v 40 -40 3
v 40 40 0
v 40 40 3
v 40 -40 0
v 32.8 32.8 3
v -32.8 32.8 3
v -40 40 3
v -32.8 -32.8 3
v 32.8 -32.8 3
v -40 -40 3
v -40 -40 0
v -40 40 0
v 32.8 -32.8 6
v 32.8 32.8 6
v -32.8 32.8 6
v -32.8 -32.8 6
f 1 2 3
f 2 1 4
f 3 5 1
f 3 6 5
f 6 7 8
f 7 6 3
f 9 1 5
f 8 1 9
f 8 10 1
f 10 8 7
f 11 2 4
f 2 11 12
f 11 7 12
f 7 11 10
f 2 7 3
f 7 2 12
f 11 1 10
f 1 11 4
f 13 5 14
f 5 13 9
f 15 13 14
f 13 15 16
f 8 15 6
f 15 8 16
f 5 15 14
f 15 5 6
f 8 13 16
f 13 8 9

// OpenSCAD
//////////VARIABLE DECLARATIONS//////////

//preview[view:north east, tilt: top diagonal]

//QR Code Data Display Method
add_sub = 2; //[1:Subtract QR Geometry,2:Add QR Geometry]

//QR Code Mirroring. No: QR code is scanable from top of object. Yes: QR code is scanable from bottom of object. NOTE: Code is already flipped for iPhone cases so it will be scanable from back of iPhone case.
code_flip = 0; //[0:No,1:Yes]

//Select Main Object
obj = 1; //[0:QR data only,1:Rectangle,2:iPhone 4,3:iPhone 5,4:Rectangle with hole]

//Thickness option for iPhone cases
case_thickness = 1.8; //[1.8:Slim,2.4:Sturdy]

//For rectangles only (will also round perimeters)
round_corner = 1; //[1:No,2:Yes]

//Two opposite corners or all four corners
corner_num = 0; //[0:Two,1:Four]

//For rectangles and perimeters only (will also round perimeters) (mm)
corner_radius = 10; 

//Width of object (mm)
tag_width = 80;

//Height of object (mm)
tag_height = 80;

//Thickness of object (mm)
tag_thickness = 3;

//X Location of hole center (for rectangle with hole) (mm)
hole_x = 30;

//Y Location of hole center (for rectanlge with hole) (mm)
hole_y = 0;

//Radius of hole (for rectanlge with hole) (mm)
hole_r = 10;

//Distance from tag edge. "-1000" for none. (works with all models, but uses tag_width, tag_height plus perimeter dimensions for size) (mm)
perimeter = -1000;

//Wall thickness of perimeter (mm)
per_w = 3;

//Wall height of perimeter (mm)
per_h = 10;

//Scale multiplier for code (base size: 1mm cubes make each code block) (multiplier)
qr_scale = 1.6;

//(DO NOT PUT IN 0 customizer won't generate stl, instead put in a very small value like 0.001 for no tolerance) Use for making a positive and negative assembly (+val makes code blocks bigger) (mm)
qr_tolerance = 0.001;

//X location of QR code center (mm)
qr_x = 0;

//Y location of QR code center (mm)
qr_y = 0;

//Z location of bottom of QR code gemometry (mm)
qr_bottom = 1;

//Thickness of QR code (mm)
qr_thickness = 5;

//Rotate QR code around z-axis (deg)
qr_rotate = 0;

//Input from data generator for dimention of QR code (copy and paste from QR SIZE.txt)
qr_size = 41;

//Input raw QR data matrix here (copy and paste from QR DATA.txt) ("5" will make a rectangle the size of the QR code bounding box driven by qr_size value entered above. NOTE: rectangle will be slightly larger than actual code data due to "white" pixels around QR code in image)
qr_data = 5;

qr_num = qr_size*qr_size;


//////////GEOMETRY MANIPULATION//////////

//Just qr data
if (obj == 0)
{
	qr_mover(qr_x, qr_y, qr_bottom, qr_rotate, qr_scale);
	if (perimeter != -1000)
	{
		perimeter();
	}
}

//Basic rectangle tag
if (obj == 1)
{
	if (add_sub == 1)
	{
		difference()
		{
			rec_tag(tag_width, tag_height, tag_thickness);
			qr_mover(qr_x, qr_y, qr_bottom, qr_rotate, qr_scale);
		}
	}
	if (add_sub == 2)
	{
		union()
		{
			rec_tag(tag_width, tag_height, tag_thickness);
			qr_mover(qr_x, qr_y, qr_bottom, qr_rotate, qr_scale);
		}
	}
	if (perimeter != -1000)
	{
		perimeter();
	}
}

//iPhone 4
if(obj == 2)
{
	if (add_sub == 1)
	{
		difference()
		{
			iPhone4Case();
			translate([0,0,qr_thickness-.1])
			rotate([180,0,0])
			qr_mover(qr_x, qr_y, qr_bottom, qr_rotate, qr_scale);
		}
	}
	if (add_sub == 2)
	{
		union()
		{
			iPhone4Case();
			translate([0,0,qr_thickness-.1])
			rotate([180,0,0])
			qr_mover(qr_x, qr_y, qr_bottom, qr_rotate, qr_scale);
		}
	}
}


//iPhone 5
if(obj == 3)
{
	if (add_sub == 1)
	{
		difference()
		{
			iPhone5Case();
			translate([0,0,qr_thickness-.1])
			rotate([180,0,0])
			qr_mover(qr_x, qr_y, qr_bottom, qr_rotate, qr_scale);
		}
	}
	if (add_sub == 2)
	{
		union()
		{
			iPhone5Case();
			translate([0,0,qr_thickness-.1])
			rotate([180,0,0])
			qr_mover(qr_x, qr_y, qr_bottom, qr_rotate, qr_scale);
		}
	}
}


//Rectangle with hole
if (obj == 4)
{
	if (add_sub == 1)
	{
		difference()
		{
			rec_tag(tag_width, tag_height, tag_thickness);
			qr_mover(qr_x, qr_y, qr_bottom, qr_rotate, qr_scale);
			translate([hole_x, hole_y, 1])
			cylinder(h=(2*tag_thickness), r=hole_r, center=true);
		}
	}
	if (add_sub == 2)
	{
		difference()
		{
			union()
			{
				rec_tag(tag_width, tag_height, tag_thickness);
				qr_mover(qr_x, qr_y, qr_bottom, qr_rotate, qr_scale);
			}
			translate([hole_x, hole_y, 1])
			cylinder(h=(2*tag_thickness), r=hole_r, center=true);
		}
	}
	if (perimeter != -1000)
	{
		perimeter();
	}
}


//////////MODULE DEFINITIONS//////////

module qr_volume(size, num, data, thickness, tol)
{
	if (qr_data == 5)
	{
		color("Snow")
		translate([0, 0, thickness/2])
		cube([size, size, thickness], center=true);
	}
	else
	{
		color("DarkGrey")
		union()
		{
			for(i = [1:1:num])
			{
				if(data[i-1] == 1)
				{
					translate([(floor(i/size)-(qr_size/2)),(i-(size*floor(i/size))-1-(qr_size/2)), 0])
					cube([1+tol, 1+tol, thickness],center=[.5,.5,0]);
				}
			}
		}
	}
}

module qr_mover(x, y, z, rotate, scale)
{
	translate([x,y,z])
	rotate([0, 0, rotate])
	scale([scale, scale, 1])
	mirror([0, code_flip, 0])
	qr_volume(qr_size, qr_num, qr_data, qr_thickness, qr_tolerance);
}

module corner_rounder(w, h, t)
{
	for (c = [0:1:corner_num])
	{
		union()
		{
			mirror([0, c, 0])
			difference()
			{
				translate([w/2, h/2, t/2])
				cylinder(h=t*2, r=corner_radius, center=true);
				translate([(w/2)-corner_radius, (h/2)-corner_radius, t/2])
				cylinder(h=t*3, r=corner_radius, center=true);
			}
			mirror([0, c, 0])
			difference()
			{
				translate([-w/2, -h/2, t/2])
				cylinder(h=t*2, r=corner_radius, center=true);
				translate([-(w/2)+corner_radius, -(h/2)+corner_radius, t/2])
				cylinder(h=t*3, r=corner_radius, center=true);
			}
		}
	}
}

module rec_tag(t_w, t_h, t_t)
{
	difference()
	{
		translate([0, 0, (t_t/2)])
		cube([t_w, t_h, t_t], center=true);
		if (round_corner == 2)
		{
			corner_rounder(t_w, t_h, t_t);
		}
	}
}

module perimeter()
{
	difference()
	{
		rec_tag(tag_width+perimeter+per_w, tag_height+perimeter+per_w, per_h);
		translate([0, 0, -1])
		rec_tag(tag_width+perimeter, tag_height+perimeter, per_h+2);
	}
}




//////////MAKERBOT IPHONE CASE//////////


/*Non customizer variables*/
caseThickness = case_thickness;
caseTolerance = .2/1;

4width=58.55/1;	
4length=115.15/1;
4height=9.34/1;
4cornerR = 8.77/1;
4swidth=6.17/1;
4sthick=.6/1;

5width = 57.57/1;
5length = 122.83/1;
5height = 7.6/1;
5cornerR = 9.28/1;
5sthick = 1.44/1;
5swidth = 5height - 5sthick*1.5;

heightvar=.24/1;

homebuttonR = 5.6/1;
homebuttonD = homebuttonR*2;

top_bottom_opening_width = 50/1;
leftholelength = 25.43/1;
leftholeR = 2.4/1;
topholelength = 38.57/1;
topholeR = 2.5/1;
bottomholelength1 = 43.97/1;
bottomholelength2 = 26.05/1;
bottombigR = 1.53/1;
bottomsmallR = 1.15/1;

corner_resolution = 6/1;
circle_resolution = corner_resolution*4;

fudge = .05/1;


//MODULES

module iPhoneGlass(w, l, h, r)
{
	union(){
		cube([w,l-r*2,h],center = true);
		cube([w-r*2,l,h],center = true);
		//top right corner
		translate([w/2-r,l/2-r,0])
			cylinder(	h = h,
						r = r,
						center = true,
						$fn = circle_resolution);
		//top left corner
		translate([-(w/2-r),l/2-r,0])
			cylinder(	h = h,
						r = r,
						center = true,
						$fn = circle_resolution);
		//bottom right corner
		translate([w/2-r,-(l/2-r),0])
			cylinder(	h = h,
					 	r = r,
						center = true,
						$fn = circle_resolution);
		//bottom left corner
		translate([-(w/2-r),-(l/2-r),0])
			cylinder(	h = h,
						r = r,
						center = true, 
						$fn = circle_resolution);
	}
}

module iPhoneStrip(	w, l, h, r, sw, st)
{
	union(){
		cube([w+st*2,l-r*2,sw],center = true);
		cube([w-r*2,l+st*2,sw],center = true);
		//top right corner
		translate([w/2-r,l/2-r,0])
			cylinder(	h = sw,
						r = r+st,
						center = true,
						$fn = circle_resolution);
		//top left corner
		translate([-(w/2-r),l/2-r,0])
			cylinder(	h = sw,
						r = r+st,
						center = true,
						$fn = circle_resolution);
		//bottom right corner
		translate([w/2-r,-(l/2-r),0])
			cylinder(	h = sw,
						r = r+st,
						center = true,
						$fn = circle_resolution);
		//bottom left corner
		translate([-(w/2-r),-(l/2-r),0])
			cylinder(	h = sw,
						r = r+st,
						center = true,
						$fn = circle_resolution);
	}
}

module iPhoneCameraHole(w,h,r){
	hull(){
		translate([w/2,0,0])
			cylinder(h = h,r = r,center = true, $fn = circle_resolution);
		translate([-w/2,0,0])
			cylinder(h = h,r = r,center = true, $fn = circle_resolution);
	}
}


module iPhone5(w,l,h,cR,sw,st){
	hull(){
		iPhoneGlass(w,l,h,cR);
		iPhoneStrip(w,l,h,cR,sw,st);
	}
}


module iPhone4(w,l,h,cR,sw,st){
	union(){
		hull(){
			iPhoneGlass(w,l,sw+st,cR);
			iPhoneStrip(w,l,h,cR,sw,st);
		}
		iPhoneGlass(w,l,h,cR);
	}
}

module iPhone5Case(){
	translate([0,0,(5height+caseThickness)/2]){
		difference(){
			hull(){
				iPhoneGlass(5width+caseThickness*2,5length+caseThickness*2,5height+caseThickness,5cornerR+caseThickness);
				iPhoneStrip(5width+caseThickness*2,5length+caseThickness*2,5height+caseThickness*2,5cornerR+caseThickness,5swidth,5sthick);
			}
			iPhone5(5width-caseTolerance*3,5length-caseTolerance*2,5height+caseTolerance,5cornerR,5swidth+caseTolerance*2,5sthick+caseTolerance);
			translate([0,0,-5height*.5])
				iPhoneGlass(5width-caseThickness*2,5length-caseThickness*2,5height,5cornerR);
			translate([0,0,5height*.5])
				iPhoneGlass(5width-caseTolerance*3,5length-caseTolerance*2,5height+caseTolerance,5cornerR);
			translate([0,0,caseThickness/2])
			cube([44,5length+20,5height+caseThickness/2],center = true);
			translate([-5width/2-caseThickness*.8,30,4.5])
				rotate([90,0,90])
				scale([1,1,2])
				iPhoneCameraHole(30,caseThickness*2,8);
		}
		difference(){
			union(){
				intersection(){
					translate([0,0,-(5height/2 + caseThickness/4 + caseTolerance/4)])
						iPhoneGlass(5width-caseThickness*2+fudge,5length-caseThickness*2+fudge,caseThickness/2-caseTolerance/2,5cornerR-fudge);
				}
				translate([15,52.4,-(5height/2 + caseThickness/4)])
					iPhoneCameraHole(7.8,caseThickness/2,7.8+1.6);
			}
			translate([15,52.4,-(5height/2 + caseThickness/4)])
				scale([1,1,2])
				iPhoneCameraHole(7.8,caseThickness/2,7.8);
		}
	}	
}

module iPhone4Case(){
	translate([0,0,(4height+caseThickness)/2]){
		difference(){
			hull(){
				iPhoneGlass(4width+caseThickness*2,4length+caseThickness*2,4height+caseThickness,4cornerR+caseThickness);
				iPhoneStrip(4width+caseThickness*2,4length+caseThickness*2,4height+caseThickness*2,4cornerR+caseThickness,4swidth,4sthick);
			}
			iPhone4(4width-caseTolerance*3,4length-caseTolerance*2,4height+caseTolerance,4cornerR,4swidth+caseTolerance*2,4sthick+caseTolerance);
			translate([0,0,4height*.5])
				iPhoneGlass(4width-caseTolerance*3,4length-caseTolerance*2,4height,4cornerR);
			translate([0,0,-4height*.5])
				iPhoneGlass(4width-caseThickness*2,4length-caseThickness*2,4height,4cornerR);
			translate([0,0,caseThickness/2])
			cube([44,4length+20,4height+caseThickness/2],center = true);
			translate([-4width/2-caseThickness*.8,30,5])
				rotate([90,0,90])
				scale([1,1,2])
				iPhoneCameraHole(24,caseThickness*2,8);
		}
		difference(){
			union(){
				intersection(){
					translate([0,0,-(4height/2 + caseThickness/4 + caseTolerance/4)])
						iPhoneGlass(4width-caseThickness*2+fudge,4length-caseThickness*2+fudge,caseThickness/2-caseTolerance/2,4cornerR+fudge);	
				}
				translate([15,48.2,-(4height/2 + caseThickness/4)])
					iPhoneCameraHole(7.8,caseThickness/2,7.8+1.6);
			}
			translate([15,48.2,-(4height/2 + caseThickness/4)])
				scale([1,1,2])
				iPhoneCameraHole(7.8,caseThickness/2,7.8);
		}
	}	
}
